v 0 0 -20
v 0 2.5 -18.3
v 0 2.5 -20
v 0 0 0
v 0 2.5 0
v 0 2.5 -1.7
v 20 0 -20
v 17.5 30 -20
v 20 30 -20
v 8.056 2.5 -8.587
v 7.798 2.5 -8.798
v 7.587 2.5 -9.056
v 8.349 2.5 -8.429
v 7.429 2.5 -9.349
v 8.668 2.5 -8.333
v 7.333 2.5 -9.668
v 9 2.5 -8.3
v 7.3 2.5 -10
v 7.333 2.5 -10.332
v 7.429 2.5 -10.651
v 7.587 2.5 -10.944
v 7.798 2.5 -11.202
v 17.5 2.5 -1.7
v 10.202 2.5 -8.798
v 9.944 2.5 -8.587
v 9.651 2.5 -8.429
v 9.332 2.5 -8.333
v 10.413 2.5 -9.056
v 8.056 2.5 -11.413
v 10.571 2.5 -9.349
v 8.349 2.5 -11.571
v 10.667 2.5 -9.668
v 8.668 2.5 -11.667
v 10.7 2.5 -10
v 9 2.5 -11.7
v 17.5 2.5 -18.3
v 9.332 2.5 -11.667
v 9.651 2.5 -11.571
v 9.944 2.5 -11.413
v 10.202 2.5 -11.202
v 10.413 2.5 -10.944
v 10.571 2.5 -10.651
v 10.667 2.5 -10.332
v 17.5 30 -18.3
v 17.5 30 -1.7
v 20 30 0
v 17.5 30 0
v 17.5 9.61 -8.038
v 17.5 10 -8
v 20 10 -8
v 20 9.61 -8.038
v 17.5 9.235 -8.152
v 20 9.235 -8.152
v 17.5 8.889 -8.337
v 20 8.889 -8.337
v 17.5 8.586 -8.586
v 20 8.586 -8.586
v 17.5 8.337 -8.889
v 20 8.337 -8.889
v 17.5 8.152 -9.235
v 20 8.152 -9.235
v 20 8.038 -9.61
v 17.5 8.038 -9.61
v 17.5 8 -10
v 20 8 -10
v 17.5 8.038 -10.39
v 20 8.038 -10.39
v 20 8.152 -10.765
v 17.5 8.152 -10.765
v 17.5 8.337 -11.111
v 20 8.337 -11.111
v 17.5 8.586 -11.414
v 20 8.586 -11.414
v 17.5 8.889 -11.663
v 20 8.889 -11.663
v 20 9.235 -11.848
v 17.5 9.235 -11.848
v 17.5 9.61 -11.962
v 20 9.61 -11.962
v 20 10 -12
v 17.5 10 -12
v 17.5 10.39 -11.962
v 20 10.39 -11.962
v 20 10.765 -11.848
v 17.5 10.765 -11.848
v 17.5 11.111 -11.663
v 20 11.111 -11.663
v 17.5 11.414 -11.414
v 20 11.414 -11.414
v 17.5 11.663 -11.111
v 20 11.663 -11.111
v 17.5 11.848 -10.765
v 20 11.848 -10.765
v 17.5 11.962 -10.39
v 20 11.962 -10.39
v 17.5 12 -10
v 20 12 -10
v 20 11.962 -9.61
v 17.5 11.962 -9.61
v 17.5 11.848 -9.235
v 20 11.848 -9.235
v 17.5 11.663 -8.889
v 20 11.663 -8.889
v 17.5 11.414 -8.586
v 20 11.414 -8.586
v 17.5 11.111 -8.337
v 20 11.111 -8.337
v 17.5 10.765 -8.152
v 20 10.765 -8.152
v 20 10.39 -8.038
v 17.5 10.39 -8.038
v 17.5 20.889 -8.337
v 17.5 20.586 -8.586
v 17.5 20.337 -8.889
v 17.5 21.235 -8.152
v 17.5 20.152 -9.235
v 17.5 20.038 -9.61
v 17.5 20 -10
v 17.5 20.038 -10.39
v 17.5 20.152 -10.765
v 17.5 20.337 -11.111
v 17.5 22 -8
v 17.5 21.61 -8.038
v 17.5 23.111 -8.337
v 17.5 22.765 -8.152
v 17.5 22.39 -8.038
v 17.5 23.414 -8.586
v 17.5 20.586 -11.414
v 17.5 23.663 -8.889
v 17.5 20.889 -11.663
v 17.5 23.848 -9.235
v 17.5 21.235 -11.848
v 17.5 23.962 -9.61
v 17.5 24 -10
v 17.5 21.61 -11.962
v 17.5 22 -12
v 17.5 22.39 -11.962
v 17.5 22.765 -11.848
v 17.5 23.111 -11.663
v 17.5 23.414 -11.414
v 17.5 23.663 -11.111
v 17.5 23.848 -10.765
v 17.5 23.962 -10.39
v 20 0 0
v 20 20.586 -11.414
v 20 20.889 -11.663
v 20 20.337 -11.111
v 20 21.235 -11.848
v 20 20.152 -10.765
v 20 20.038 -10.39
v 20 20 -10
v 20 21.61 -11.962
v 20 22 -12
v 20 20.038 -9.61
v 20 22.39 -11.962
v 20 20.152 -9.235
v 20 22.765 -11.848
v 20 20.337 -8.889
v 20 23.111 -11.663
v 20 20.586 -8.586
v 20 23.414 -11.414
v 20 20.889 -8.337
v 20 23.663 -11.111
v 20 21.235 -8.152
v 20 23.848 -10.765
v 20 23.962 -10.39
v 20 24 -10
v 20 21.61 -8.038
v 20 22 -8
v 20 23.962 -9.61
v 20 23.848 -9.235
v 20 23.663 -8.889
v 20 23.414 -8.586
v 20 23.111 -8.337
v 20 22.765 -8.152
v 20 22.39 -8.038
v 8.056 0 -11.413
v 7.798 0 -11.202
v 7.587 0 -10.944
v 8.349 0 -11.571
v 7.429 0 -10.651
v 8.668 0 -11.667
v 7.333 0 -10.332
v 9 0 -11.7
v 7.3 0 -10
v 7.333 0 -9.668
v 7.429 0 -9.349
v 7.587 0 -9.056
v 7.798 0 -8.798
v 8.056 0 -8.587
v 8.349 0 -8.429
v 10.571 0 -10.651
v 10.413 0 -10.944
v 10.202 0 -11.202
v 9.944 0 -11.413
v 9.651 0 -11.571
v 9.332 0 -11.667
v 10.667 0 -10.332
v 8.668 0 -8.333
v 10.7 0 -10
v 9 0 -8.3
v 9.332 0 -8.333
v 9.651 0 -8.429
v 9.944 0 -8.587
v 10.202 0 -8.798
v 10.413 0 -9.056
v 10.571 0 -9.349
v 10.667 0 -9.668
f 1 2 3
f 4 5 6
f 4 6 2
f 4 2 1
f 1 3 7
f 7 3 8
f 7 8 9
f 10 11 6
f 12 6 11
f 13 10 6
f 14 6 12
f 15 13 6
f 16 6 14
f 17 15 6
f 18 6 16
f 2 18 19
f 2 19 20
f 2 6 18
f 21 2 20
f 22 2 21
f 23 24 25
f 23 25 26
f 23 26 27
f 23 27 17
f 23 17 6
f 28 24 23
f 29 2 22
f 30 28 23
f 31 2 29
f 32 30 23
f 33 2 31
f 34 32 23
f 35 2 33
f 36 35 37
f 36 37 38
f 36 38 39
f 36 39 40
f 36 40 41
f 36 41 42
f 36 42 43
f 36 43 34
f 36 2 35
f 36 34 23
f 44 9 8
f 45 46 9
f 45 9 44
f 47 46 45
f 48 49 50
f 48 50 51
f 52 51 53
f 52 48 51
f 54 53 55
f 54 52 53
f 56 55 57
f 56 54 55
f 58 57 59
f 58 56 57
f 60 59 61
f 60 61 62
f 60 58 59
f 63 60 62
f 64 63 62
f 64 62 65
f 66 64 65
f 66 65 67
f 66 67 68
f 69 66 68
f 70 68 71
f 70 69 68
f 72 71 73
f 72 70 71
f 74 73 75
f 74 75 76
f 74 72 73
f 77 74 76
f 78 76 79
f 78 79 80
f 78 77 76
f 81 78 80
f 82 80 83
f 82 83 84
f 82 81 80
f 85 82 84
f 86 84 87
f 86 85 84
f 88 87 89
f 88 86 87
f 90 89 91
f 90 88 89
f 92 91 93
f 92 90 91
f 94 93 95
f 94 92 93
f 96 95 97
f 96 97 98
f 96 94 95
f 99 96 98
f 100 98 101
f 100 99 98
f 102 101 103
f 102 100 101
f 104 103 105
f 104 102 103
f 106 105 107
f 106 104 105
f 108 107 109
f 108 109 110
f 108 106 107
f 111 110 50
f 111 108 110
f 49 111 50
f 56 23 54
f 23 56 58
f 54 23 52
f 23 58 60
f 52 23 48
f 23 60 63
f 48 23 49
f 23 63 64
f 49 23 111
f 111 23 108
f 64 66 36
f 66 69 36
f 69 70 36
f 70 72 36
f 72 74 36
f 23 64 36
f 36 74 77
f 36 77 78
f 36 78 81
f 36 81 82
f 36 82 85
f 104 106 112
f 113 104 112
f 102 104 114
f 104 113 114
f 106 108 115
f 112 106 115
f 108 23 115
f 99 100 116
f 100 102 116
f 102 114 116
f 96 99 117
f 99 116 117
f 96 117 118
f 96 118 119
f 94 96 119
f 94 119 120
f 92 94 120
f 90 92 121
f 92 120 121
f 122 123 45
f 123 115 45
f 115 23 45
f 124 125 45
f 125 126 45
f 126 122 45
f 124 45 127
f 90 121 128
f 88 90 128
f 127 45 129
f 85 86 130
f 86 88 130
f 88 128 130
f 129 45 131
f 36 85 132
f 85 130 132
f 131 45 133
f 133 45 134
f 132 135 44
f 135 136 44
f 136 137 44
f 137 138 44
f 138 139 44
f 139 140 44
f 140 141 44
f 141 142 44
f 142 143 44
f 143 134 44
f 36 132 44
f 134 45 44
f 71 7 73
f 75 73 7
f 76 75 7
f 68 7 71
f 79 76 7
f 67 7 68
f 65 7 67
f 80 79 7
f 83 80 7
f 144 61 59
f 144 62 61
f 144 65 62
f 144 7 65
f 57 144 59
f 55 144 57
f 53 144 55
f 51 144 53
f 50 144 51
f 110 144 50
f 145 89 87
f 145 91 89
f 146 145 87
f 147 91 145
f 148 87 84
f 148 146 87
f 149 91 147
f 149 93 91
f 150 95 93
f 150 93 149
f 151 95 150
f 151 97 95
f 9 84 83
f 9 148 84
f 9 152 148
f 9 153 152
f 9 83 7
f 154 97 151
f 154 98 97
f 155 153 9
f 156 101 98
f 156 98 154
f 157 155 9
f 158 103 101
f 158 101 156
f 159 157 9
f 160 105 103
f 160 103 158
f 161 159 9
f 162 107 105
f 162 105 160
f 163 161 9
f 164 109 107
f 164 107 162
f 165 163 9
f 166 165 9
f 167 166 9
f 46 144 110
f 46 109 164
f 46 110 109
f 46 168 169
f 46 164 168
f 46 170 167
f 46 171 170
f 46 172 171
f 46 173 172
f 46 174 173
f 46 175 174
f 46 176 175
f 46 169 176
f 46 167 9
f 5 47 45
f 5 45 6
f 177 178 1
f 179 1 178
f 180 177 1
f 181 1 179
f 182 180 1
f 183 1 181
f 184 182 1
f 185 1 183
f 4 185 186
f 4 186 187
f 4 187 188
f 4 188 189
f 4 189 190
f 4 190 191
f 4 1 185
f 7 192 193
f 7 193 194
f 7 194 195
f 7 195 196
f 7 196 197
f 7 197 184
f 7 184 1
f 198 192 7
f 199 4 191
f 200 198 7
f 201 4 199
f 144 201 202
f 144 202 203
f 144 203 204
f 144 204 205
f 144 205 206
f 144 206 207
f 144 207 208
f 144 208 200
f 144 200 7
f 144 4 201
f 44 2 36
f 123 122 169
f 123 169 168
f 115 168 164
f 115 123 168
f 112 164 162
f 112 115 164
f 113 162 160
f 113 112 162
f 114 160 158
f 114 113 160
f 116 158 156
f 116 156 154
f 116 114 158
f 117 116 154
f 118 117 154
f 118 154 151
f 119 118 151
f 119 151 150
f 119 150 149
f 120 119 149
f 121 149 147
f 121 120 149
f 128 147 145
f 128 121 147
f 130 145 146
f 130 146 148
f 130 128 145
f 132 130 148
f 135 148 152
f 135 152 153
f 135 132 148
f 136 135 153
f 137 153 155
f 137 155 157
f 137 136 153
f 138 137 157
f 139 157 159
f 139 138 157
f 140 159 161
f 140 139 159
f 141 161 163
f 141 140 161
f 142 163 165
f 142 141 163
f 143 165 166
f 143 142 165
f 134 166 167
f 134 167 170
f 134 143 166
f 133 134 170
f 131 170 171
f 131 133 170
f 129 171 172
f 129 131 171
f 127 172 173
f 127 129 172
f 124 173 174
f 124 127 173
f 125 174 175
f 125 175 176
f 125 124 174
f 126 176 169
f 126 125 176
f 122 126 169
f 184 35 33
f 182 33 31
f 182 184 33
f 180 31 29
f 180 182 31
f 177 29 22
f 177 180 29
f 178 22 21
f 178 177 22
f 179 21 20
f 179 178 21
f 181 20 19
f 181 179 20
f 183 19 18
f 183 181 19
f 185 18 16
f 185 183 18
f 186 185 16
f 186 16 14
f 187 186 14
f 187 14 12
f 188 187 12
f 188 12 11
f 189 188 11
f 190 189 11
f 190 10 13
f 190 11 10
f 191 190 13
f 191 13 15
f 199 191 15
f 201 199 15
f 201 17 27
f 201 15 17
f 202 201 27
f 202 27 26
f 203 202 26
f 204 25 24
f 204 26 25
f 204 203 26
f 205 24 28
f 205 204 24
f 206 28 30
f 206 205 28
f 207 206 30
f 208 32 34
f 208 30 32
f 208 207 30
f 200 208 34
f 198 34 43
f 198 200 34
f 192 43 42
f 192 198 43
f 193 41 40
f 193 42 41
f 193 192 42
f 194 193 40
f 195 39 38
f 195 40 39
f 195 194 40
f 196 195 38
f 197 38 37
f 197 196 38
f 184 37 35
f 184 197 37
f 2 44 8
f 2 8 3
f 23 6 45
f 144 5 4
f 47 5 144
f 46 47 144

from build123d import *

# Parameters (mm, degrees)
EXTRUDE_1_DEPTH     = 20
CUT_EXTRUDE_START   = 30
SKETCH_2_W          = 17.5
SKETCH_2_H          = 16.6
CUT_EXTRUDE_1_DEPTH = 27.5
CUT_EXTRUDE_START_2 = 17.5
SKETCH_3_R          = 2
CUT_EXTRUDE_2_DEPTH = 2.5
CUT_EXTRUDE_3_REACH = 43.231
SKETCH_4_R          = 1.7


with BuildPart() as part:
    # 草图1 → 凸台-拉伸1 (new body)
    with BuildSketch(Plane.XY):
        Polygon((0, 0), (20, 0), (20, 30), (17.5, 30), (0, 2.5), align=None)
    extrude(amount=-EXTRUDE_1_DEPTH)

    # 草图2 → 切除-拉伸1 (cut)
    with BuildSketch(Plane(origin=(0, 0, 0), x_dir=(1, 0, 0), z_dir=(0, 1, 0)).offset(CUT_EXTRUDE_START)):
        with Locations((8.75, 10)):
            Rectangle(SKETCH_2_W, SKETCH_2_H)
    extrude(amount=-CUT_EXTRUDE_1_DEPTH, mode=Mode.SUBTRACT)

    # 草图3 → 切除-拉伸2 (cut)
    with BuildSketch(Plane(origin=(0, 0, 0), x_dir=(0, 0, -1), z_dir=(1, 0, 0)).offset(CUT_EXTRUDE_START_2)):
        with Locations(Location((10, 22, 0), (0, 0, 180))):
            Circle(SKETCH_3_R)
        with Locations(Location((10, 10, 0), (0, 0, 180))):
            Circle(SKETCH_3_R)
    extrude(amount=CUT_EXTRUDE_2_DEPTH, mode=Mode.SUBTRACT)

    # 草图4 → 切除-拉伸3 (cut, up to next)
    with BuildSketch(Plane(origin=(0, 0, 0), x_dir=(1, 0, 0), z_dir=(0, 1, 0)), mode=Mode.PRIVATE) as cut_extrude_3_sk1:
        with Locations(Location((9, 10, 0), (0, 0, 90))):
            Circle(SKETCH_4_R)
    cut_extrude_3_tool1 = extrude(cut_extrude_3_sk1.sketch, amount=CUT_EXTRUDE_3_REACH, mode=Mode.PRIVATE) & part.part
    add(cut_extrude_3_tool1.solids().sort_by_distance((9, 0, -10))[0], mode=Mode.SUBTRACT)


solid = part.part
